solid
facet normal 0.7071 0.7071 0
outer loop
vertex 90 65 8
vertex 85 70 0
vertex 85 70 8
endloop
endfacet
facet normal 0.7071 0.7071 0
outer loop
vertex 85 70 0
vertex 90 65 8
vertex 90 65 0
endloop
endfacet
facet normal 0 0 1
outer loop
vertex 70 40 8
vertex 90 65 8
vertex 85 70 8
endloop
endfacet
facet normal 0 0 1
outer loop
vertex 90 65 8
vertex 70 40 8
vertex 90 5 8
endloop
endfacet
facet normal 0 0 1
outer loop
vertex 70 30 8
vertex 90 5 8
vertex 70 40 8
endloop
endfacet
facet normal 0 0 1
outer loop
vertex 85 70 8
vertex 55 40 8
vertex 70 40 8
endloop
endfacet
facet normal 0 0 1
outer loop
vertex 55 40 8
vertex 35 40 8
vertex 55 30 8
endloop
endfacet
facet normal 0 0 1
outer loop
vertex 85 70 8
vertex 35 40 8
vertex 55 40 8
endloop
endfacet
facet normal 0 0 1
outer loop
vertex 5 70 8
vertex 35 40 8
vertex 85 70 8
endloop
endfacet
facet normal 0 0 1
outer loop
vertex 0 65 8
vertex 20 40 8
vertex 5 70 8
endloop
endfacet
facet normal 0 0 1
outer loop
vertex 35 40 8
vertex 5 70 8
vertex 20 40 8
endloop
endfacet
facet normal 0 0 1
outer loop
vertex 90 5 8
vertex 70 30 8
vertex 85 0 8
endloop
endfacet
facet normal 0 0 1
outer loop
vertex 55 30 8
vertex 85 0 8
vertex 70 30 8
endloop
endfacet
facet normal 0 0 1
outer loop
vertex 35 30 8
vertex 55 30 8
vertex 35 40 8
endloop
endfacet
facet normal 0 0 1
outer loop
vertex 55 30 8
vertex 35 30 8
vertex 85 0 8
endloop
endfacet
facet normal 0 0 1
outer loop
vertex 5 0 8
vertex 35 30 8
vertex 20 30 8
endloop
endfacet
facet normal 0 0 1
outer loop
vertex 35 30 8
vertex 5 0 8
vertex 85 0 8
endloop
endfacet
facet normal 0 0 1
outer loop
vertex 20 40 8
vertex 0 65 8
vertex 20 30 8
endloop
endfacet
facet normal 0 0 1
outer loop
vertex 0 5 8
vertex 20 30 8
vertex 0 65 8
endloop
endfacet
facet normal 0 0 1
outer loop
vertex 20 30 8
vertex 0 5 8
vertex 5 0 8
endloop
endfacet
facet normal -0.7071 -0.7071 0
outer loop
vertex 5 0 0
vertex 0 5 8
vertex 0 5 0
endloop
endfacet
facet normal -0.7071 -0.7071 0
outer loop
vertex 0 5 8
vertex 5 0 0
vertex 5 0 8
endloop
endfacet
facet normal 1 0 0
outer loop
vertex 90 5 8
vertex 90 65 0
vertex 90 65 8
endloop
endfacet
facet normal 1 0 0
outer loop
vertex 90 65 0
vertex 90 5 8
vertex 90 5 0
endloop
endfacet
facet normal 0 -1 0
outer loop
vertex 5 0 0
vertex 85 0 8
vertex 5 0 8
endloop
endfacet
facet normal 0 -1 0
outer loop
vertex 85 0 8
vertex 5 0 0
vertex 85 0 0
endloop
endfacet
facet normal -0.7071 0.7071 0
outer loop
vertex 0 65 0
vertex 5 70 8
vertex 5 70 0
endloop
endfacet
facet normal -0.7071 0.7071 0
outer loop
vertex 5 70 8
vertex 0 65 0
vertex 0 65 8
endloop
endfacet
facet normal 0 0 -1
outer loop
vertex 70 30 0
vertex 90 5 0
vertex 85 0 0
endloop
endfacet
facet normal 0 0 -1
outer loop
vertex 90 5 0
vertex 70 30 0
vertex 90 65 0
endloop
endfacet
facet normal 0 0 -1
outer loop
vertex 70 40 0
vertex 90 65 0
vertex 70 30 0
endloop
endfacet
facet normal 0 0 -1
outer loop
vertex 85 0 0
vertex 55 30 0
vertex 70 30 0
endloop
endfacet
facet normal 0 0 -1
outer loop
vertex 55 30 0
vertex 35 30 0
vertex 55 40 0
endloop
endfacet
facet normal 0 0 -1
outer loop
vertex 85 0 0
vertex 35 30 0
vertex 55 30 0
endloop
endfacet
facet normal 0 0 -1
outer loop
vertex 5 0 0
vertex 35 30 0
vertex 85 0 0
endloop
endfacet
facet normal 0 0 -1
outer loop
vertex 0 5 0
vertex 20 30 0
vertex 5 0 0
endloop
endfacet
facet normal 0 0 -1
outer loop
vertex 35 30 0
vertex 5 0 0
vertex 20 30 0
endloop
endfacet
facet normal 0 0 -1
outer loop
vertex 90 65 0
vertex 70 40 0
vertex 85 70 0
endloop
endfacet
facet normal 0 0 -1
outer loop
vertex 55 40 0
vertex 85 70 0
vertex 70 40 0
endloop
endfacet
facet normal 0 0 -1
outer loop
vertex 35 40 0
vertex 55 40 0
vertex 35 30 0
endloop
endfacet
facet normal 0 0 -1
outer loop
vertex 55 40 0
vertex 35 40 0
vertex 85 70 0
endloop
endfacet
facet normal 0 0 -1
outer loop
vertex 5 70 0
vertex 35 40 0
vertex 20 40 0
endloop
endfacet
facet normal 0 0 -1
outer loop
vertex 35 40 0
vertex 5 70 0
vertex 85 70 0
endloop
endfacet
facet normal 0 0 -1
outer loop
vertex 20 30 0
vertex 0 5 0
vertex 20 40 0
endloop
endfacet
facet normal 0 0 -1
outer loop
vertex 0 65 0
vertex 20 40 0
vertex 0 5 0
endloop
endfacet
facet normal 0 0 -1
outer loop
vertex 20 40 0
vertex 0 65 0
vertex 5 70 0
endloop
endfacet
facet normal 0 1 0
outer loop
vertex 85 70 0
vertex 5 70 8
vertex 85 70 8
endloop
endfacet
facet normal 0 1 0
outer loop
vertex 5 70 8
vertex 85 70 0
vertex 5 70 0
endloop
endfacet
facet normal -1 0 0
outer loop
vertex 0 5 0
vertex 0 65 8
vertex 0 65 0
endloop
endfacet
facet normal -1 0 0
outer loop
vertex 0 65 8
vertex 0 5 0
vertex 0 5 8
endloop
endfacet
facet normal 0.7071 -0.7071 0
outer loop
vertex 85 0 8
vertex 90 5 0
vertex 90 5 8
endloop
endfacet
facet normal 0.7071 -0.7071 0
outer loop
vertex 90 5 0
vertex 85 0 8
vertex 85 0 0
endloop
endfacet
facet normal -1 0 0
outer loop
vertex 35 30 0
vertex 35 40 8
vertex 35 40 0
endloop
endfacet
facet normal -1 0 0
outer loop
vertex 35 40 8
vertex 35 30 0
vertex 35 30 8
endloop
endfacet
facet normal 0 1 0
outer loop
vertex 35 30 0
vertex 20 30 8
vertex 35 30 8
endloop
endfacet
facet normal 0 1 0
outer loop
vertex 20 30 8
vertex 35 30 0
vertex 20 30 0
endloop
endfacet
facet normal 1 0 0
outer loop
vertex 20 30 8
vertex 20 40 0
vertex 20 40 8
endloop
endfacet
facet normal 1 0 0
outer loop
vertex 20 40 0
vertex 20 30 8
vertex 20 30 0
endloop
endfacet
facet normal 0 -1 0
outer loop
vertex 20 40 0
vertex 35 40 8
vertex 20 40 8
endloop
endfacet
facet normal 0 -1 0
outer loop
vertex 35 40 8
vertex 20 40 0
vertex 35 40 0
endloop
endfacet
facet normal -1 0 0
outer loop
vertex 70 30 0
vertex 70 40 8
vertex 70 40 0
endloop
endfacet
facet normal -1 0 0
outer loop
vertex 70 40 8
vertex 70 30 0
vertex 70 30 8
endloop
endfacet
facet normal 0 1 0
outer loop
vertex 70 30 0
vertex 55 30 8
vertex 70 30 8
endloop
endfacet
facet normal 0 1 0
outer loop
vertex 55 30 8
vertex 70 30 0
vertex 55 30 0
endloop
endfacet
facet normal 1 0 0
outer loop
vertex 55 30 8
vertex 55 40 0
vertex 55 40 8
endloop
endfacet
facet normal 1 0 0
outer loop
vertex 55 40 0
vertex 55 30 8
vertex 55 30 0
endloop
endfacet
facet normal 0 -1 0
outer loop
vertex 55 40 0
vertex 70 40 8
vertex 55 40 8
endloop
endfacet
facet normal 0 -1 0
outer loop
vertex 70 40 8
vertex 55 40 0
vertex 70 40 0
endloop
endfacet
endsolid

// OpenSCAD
$fn = 32;

// ----------------------------------------------------------------------
// Windowed plate: 2 voids, 90 x 70 x 8 mm
// ----------------------------------------------------------------------

// --- parameters (mm) ---
plate_l = 90;             // plate length, X
plate_w = 70;             // plate width, Y
plate_t = 8;              // plate thickness, Z
edge_margin = 10;         // wall from the plate edge to any window
windows = 2;              // number of windows in the row
win_l = 15;               // window length
win_w = 10;               // window width
win_pitch = 35;           // window pitch along X
depth_1 = 8;              // depth of void 1 (full thickness = through)
depth_2 = 8;              // depth of void 2 (full thickness = through)
corner_c = 5;             // corner chamfer of the plate
fit_tol = 0.1;            // declared fit tolerance (prompt contract)
free_tol = 0.5;           // declared free tolerance (prompt contract)

profile = [[5, 0], [85, 0], [90, 5], [90, 65], [85, 70], [5, 70], [0, 65], [0, 5]];  // primary outline, 8 points, counter clockwise
void_1 = [[20, 30], [35, 30], [35, 40], [20, 40]];  // window 1 of the row, 4 points
void_2 = [[55, 30], [70, 30], [70, 40], [55, 40]];  // window 2 of the row, 4 points

// --- the one profile operation ---
difference() {
  linear_extrude(height = plate_t) polygon(points = profile);
  translate([0, 0, -1])
    linear_extrude(height = plate_t + 2) polygon(points = void_1);
  translate([0, 0, -1])
    linear_extrude(height = plate_t + 2) polygon(points = void_2);
}
